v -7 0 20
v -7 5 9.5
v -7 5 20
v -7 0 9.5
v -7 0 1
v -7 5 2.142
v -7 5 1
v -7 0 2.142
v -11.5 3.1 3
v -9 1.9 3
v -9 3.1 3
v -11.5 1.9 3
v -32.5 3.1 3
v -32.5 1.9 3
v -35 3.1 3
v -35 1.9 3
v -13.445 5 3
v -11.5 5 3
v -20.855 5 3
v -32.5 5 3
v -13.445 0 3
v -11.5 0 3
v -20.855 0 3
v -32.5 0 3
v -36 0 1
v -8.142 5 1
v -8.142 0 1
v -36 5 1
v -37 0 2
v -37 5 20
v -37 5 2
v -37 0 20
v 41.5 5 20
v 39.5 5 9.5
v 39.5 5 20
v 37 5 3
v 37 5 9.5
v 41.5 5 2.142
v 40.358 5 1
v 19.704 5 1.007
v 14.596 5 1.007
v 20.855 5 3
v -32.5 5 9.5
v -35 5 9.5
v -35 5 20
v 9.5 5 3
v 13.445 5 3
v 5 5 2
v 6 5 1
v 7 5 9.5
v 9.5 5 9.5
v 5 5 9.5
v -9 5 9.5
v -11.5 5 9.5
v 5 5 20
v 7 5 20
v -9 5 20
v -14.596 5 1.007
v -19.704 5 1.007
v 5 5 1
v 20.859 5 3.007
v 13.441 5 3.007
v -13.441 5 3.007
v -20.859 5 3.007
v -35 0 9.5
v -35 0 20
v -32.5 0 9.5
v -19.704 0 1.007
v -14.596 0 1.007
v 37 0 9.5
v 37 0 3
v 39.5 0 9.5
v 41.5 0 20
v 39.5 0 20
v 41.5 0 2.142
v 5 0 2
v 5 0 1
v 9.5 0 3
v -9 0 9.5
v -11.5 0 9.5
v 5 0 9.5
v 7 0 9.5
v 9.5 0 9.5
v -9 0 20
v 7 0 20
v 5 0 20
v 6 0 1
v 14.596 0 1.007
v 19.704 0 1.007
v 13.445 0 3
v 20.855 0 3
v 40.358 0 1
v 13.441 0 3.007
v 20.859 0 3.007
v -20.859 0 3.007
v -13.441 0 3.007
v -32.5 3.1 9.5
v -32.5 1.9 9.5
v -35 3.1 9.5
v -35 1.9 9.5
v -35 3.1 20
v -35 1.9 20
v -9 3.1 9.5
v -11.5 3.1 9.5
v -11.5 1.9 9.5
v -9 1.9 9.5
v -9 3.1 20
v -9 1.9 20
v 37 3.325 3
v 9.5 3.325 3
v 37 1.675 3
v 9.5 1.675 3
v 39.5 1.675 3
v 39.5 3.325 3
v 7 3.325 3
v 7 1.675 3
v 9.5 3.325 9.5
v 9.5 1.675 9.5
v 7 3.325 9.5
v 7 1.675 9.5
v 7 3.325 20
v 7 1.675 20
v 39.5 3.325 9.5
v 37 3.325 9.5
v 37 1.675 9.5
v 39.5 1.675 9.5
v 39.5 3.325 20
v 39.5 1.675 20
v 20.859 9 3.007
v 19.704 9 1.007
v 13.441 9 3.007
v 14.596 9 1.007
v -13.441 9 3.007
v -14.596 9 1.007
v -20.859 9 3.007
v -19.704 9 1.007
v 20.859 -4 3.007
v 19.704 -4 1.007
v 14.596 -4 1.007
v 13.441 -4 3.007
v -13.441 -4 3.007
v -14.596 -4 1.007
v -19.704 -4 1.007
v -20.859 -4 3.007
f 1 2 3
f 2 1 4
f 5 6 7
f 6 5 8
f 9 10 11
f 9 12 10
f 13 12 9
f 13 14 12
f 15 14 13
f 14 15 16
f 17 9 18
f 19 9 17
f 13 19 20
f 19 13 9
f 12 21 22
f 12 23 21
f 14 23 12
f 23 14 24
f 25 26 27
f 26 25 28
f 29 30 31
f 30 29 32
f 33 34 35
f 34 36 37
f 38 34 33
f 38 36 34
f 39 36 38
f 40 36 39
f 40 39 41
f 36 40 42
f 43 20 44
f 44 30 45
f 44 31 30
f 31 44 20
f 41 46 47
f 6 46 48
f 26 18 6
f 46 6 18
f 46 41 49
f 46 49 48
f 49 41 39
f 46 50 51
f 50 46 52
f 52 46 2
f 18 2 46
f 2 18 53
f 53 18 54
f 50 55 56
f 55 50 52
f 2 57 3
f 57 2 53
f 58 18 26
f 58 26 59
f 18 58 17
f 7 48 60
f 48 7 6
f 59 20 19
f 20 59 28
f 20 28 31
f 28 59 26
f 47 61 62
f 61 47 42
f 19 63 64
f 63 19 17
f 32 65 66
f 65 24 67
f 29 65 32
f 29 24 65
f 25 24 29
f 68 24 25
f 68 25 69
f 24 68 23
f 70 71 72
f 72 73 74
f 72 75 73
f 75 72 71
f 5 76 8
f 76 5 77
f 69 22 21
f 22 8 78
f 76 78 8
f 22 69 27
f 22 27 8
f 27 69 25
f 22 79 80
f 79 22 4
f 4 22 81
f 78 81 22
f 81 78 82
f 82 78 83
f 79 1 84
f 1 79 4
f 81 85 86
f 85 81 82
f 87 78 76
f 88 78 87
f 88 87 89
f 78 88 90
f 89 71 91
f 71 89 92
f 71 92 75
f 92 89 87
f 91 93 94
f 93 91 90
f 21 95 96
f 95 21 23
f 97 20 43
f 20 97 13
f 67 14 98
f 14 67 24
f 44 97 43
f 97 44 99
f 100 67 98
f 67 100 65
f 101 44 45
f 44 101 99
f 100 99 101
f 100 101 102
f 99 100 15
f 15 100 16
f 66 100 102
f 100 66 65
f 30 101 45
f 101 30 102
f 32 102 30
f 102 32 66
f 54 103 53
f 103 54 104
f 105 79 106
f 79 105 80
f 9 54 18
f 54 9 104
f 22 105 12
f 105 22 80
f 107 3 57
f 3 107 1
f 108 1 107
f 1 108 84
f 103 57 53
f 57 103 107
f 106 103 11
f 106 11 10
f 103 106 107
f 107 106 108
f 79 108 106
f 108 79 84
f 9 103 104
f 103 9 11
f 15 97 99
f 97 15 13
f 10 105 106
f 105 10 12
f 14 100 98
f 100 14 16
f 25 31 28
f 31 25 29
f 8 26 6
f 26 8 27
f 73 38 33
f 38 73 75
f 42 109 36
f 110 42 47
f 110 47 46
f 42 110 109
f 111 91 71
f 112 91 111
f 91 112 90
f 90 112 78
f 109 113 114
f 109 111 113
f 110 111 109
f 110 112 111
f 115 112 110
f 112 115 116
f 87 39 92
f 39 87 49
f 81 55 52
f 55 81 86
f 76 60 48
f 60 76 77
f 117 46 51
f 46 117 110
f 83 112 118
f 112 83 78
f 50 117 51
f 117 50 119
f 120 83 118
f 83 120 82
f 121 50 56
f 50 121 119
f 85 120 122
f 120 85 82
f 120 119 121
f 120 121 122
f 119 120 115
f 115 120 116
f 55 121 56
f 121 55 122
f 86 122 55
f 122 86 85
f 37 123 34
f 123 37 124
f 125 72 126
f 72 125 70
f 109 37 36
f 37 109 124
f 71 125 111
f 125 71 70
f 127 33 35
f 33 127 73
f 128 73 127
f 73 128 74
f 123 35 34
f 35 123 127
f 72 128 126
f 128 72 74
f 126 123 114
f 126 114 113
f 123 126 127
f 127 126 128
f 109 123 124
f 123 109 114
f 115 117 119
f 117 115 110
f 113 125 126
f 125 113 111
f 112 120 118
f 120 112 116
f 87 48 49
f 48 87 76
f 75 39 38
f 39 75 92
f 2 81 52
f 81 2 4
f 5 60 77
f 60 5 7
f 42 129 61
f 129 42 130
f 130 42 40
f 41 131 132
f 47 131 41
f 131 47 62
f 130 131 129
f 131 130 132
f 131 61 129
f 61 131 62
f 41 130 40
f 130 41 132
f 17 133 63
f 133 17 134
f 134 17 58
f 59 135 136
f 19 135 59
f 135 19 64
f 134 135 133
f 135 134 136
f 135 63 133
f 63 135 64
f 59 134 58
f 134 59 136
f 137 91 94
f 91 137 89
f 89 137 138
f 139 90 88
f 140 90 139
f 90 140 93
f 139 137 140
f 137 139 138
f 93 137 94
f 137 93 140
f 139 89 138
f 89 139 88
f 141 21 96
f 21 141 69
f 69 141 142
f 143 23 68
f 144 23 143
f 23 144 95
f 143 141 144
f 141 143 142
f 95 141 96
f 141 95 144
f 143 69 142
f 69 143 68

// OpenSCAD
boardMount(9,0,false);
boardMount(0,10,true);

module boardMount(ht,bb,usbHole) {
  w1=26;
  t1=1.20;
 
  w2=32.5;
  t2=1.65;
 
  d=12;

  m=w1+5+d/2;
  
  hr=5.1;


  

  translate([-m,0,0]) {
    boardStand(w1,t1,bb,usbHole);
    translate([w1+4+d,0,0]) boardStand(w2,t2);
    translate([w1+4,0,1]) cube([d,5,8.5]);
  }
    


  translate([17.15,ht,hr*sqrt(3)/2+1]) rotate([90,0,0]) intersection() {
    cylinder(r=hr,h=4,$fn=6);
    translate([-hr,-hr+0.69,0]) cube([hr*2,2,4]);
  }
  translate([-17.15,ht,hr*sqrt(3)/2+1]) rotate([90,0,0]) intersection() {
    cylinder(r=hr,h=4,$fn=6);
    translate([-hr,-hr+0.69,0]) cube([hr*2,2,4]);
  }
}


module boardStand(bw,bt,bb=0,usbHole=false) {
  difference() {
    translate([0,0,1]) union() {
      cube([bw+4,5,2]);
      cube([4.5,5,8.5]);
      cube([2,5,19]);
      translate([bw-0.5,0,0]) cube([4.5,5,8.5]);
      translate([bw+2,0,0]) cube([2,5,19]);
    }
    translate([2,(5-bt)/2,3]) cube([bw,bt+bb,20]);
    if(usbHole) {
      translate([bw/2-3,2.5,-1]) cube([10,3.5,20]);
    }
   translate([4,0,-2]) rotate([0,-135,0]) translate([0,-1,0]) cube([10,20,10]);
      translate([bw+14,0,-2]) rotate([0,-135,0]) translate([0,-1,0]) cube([10,20,10]);

  }
}
